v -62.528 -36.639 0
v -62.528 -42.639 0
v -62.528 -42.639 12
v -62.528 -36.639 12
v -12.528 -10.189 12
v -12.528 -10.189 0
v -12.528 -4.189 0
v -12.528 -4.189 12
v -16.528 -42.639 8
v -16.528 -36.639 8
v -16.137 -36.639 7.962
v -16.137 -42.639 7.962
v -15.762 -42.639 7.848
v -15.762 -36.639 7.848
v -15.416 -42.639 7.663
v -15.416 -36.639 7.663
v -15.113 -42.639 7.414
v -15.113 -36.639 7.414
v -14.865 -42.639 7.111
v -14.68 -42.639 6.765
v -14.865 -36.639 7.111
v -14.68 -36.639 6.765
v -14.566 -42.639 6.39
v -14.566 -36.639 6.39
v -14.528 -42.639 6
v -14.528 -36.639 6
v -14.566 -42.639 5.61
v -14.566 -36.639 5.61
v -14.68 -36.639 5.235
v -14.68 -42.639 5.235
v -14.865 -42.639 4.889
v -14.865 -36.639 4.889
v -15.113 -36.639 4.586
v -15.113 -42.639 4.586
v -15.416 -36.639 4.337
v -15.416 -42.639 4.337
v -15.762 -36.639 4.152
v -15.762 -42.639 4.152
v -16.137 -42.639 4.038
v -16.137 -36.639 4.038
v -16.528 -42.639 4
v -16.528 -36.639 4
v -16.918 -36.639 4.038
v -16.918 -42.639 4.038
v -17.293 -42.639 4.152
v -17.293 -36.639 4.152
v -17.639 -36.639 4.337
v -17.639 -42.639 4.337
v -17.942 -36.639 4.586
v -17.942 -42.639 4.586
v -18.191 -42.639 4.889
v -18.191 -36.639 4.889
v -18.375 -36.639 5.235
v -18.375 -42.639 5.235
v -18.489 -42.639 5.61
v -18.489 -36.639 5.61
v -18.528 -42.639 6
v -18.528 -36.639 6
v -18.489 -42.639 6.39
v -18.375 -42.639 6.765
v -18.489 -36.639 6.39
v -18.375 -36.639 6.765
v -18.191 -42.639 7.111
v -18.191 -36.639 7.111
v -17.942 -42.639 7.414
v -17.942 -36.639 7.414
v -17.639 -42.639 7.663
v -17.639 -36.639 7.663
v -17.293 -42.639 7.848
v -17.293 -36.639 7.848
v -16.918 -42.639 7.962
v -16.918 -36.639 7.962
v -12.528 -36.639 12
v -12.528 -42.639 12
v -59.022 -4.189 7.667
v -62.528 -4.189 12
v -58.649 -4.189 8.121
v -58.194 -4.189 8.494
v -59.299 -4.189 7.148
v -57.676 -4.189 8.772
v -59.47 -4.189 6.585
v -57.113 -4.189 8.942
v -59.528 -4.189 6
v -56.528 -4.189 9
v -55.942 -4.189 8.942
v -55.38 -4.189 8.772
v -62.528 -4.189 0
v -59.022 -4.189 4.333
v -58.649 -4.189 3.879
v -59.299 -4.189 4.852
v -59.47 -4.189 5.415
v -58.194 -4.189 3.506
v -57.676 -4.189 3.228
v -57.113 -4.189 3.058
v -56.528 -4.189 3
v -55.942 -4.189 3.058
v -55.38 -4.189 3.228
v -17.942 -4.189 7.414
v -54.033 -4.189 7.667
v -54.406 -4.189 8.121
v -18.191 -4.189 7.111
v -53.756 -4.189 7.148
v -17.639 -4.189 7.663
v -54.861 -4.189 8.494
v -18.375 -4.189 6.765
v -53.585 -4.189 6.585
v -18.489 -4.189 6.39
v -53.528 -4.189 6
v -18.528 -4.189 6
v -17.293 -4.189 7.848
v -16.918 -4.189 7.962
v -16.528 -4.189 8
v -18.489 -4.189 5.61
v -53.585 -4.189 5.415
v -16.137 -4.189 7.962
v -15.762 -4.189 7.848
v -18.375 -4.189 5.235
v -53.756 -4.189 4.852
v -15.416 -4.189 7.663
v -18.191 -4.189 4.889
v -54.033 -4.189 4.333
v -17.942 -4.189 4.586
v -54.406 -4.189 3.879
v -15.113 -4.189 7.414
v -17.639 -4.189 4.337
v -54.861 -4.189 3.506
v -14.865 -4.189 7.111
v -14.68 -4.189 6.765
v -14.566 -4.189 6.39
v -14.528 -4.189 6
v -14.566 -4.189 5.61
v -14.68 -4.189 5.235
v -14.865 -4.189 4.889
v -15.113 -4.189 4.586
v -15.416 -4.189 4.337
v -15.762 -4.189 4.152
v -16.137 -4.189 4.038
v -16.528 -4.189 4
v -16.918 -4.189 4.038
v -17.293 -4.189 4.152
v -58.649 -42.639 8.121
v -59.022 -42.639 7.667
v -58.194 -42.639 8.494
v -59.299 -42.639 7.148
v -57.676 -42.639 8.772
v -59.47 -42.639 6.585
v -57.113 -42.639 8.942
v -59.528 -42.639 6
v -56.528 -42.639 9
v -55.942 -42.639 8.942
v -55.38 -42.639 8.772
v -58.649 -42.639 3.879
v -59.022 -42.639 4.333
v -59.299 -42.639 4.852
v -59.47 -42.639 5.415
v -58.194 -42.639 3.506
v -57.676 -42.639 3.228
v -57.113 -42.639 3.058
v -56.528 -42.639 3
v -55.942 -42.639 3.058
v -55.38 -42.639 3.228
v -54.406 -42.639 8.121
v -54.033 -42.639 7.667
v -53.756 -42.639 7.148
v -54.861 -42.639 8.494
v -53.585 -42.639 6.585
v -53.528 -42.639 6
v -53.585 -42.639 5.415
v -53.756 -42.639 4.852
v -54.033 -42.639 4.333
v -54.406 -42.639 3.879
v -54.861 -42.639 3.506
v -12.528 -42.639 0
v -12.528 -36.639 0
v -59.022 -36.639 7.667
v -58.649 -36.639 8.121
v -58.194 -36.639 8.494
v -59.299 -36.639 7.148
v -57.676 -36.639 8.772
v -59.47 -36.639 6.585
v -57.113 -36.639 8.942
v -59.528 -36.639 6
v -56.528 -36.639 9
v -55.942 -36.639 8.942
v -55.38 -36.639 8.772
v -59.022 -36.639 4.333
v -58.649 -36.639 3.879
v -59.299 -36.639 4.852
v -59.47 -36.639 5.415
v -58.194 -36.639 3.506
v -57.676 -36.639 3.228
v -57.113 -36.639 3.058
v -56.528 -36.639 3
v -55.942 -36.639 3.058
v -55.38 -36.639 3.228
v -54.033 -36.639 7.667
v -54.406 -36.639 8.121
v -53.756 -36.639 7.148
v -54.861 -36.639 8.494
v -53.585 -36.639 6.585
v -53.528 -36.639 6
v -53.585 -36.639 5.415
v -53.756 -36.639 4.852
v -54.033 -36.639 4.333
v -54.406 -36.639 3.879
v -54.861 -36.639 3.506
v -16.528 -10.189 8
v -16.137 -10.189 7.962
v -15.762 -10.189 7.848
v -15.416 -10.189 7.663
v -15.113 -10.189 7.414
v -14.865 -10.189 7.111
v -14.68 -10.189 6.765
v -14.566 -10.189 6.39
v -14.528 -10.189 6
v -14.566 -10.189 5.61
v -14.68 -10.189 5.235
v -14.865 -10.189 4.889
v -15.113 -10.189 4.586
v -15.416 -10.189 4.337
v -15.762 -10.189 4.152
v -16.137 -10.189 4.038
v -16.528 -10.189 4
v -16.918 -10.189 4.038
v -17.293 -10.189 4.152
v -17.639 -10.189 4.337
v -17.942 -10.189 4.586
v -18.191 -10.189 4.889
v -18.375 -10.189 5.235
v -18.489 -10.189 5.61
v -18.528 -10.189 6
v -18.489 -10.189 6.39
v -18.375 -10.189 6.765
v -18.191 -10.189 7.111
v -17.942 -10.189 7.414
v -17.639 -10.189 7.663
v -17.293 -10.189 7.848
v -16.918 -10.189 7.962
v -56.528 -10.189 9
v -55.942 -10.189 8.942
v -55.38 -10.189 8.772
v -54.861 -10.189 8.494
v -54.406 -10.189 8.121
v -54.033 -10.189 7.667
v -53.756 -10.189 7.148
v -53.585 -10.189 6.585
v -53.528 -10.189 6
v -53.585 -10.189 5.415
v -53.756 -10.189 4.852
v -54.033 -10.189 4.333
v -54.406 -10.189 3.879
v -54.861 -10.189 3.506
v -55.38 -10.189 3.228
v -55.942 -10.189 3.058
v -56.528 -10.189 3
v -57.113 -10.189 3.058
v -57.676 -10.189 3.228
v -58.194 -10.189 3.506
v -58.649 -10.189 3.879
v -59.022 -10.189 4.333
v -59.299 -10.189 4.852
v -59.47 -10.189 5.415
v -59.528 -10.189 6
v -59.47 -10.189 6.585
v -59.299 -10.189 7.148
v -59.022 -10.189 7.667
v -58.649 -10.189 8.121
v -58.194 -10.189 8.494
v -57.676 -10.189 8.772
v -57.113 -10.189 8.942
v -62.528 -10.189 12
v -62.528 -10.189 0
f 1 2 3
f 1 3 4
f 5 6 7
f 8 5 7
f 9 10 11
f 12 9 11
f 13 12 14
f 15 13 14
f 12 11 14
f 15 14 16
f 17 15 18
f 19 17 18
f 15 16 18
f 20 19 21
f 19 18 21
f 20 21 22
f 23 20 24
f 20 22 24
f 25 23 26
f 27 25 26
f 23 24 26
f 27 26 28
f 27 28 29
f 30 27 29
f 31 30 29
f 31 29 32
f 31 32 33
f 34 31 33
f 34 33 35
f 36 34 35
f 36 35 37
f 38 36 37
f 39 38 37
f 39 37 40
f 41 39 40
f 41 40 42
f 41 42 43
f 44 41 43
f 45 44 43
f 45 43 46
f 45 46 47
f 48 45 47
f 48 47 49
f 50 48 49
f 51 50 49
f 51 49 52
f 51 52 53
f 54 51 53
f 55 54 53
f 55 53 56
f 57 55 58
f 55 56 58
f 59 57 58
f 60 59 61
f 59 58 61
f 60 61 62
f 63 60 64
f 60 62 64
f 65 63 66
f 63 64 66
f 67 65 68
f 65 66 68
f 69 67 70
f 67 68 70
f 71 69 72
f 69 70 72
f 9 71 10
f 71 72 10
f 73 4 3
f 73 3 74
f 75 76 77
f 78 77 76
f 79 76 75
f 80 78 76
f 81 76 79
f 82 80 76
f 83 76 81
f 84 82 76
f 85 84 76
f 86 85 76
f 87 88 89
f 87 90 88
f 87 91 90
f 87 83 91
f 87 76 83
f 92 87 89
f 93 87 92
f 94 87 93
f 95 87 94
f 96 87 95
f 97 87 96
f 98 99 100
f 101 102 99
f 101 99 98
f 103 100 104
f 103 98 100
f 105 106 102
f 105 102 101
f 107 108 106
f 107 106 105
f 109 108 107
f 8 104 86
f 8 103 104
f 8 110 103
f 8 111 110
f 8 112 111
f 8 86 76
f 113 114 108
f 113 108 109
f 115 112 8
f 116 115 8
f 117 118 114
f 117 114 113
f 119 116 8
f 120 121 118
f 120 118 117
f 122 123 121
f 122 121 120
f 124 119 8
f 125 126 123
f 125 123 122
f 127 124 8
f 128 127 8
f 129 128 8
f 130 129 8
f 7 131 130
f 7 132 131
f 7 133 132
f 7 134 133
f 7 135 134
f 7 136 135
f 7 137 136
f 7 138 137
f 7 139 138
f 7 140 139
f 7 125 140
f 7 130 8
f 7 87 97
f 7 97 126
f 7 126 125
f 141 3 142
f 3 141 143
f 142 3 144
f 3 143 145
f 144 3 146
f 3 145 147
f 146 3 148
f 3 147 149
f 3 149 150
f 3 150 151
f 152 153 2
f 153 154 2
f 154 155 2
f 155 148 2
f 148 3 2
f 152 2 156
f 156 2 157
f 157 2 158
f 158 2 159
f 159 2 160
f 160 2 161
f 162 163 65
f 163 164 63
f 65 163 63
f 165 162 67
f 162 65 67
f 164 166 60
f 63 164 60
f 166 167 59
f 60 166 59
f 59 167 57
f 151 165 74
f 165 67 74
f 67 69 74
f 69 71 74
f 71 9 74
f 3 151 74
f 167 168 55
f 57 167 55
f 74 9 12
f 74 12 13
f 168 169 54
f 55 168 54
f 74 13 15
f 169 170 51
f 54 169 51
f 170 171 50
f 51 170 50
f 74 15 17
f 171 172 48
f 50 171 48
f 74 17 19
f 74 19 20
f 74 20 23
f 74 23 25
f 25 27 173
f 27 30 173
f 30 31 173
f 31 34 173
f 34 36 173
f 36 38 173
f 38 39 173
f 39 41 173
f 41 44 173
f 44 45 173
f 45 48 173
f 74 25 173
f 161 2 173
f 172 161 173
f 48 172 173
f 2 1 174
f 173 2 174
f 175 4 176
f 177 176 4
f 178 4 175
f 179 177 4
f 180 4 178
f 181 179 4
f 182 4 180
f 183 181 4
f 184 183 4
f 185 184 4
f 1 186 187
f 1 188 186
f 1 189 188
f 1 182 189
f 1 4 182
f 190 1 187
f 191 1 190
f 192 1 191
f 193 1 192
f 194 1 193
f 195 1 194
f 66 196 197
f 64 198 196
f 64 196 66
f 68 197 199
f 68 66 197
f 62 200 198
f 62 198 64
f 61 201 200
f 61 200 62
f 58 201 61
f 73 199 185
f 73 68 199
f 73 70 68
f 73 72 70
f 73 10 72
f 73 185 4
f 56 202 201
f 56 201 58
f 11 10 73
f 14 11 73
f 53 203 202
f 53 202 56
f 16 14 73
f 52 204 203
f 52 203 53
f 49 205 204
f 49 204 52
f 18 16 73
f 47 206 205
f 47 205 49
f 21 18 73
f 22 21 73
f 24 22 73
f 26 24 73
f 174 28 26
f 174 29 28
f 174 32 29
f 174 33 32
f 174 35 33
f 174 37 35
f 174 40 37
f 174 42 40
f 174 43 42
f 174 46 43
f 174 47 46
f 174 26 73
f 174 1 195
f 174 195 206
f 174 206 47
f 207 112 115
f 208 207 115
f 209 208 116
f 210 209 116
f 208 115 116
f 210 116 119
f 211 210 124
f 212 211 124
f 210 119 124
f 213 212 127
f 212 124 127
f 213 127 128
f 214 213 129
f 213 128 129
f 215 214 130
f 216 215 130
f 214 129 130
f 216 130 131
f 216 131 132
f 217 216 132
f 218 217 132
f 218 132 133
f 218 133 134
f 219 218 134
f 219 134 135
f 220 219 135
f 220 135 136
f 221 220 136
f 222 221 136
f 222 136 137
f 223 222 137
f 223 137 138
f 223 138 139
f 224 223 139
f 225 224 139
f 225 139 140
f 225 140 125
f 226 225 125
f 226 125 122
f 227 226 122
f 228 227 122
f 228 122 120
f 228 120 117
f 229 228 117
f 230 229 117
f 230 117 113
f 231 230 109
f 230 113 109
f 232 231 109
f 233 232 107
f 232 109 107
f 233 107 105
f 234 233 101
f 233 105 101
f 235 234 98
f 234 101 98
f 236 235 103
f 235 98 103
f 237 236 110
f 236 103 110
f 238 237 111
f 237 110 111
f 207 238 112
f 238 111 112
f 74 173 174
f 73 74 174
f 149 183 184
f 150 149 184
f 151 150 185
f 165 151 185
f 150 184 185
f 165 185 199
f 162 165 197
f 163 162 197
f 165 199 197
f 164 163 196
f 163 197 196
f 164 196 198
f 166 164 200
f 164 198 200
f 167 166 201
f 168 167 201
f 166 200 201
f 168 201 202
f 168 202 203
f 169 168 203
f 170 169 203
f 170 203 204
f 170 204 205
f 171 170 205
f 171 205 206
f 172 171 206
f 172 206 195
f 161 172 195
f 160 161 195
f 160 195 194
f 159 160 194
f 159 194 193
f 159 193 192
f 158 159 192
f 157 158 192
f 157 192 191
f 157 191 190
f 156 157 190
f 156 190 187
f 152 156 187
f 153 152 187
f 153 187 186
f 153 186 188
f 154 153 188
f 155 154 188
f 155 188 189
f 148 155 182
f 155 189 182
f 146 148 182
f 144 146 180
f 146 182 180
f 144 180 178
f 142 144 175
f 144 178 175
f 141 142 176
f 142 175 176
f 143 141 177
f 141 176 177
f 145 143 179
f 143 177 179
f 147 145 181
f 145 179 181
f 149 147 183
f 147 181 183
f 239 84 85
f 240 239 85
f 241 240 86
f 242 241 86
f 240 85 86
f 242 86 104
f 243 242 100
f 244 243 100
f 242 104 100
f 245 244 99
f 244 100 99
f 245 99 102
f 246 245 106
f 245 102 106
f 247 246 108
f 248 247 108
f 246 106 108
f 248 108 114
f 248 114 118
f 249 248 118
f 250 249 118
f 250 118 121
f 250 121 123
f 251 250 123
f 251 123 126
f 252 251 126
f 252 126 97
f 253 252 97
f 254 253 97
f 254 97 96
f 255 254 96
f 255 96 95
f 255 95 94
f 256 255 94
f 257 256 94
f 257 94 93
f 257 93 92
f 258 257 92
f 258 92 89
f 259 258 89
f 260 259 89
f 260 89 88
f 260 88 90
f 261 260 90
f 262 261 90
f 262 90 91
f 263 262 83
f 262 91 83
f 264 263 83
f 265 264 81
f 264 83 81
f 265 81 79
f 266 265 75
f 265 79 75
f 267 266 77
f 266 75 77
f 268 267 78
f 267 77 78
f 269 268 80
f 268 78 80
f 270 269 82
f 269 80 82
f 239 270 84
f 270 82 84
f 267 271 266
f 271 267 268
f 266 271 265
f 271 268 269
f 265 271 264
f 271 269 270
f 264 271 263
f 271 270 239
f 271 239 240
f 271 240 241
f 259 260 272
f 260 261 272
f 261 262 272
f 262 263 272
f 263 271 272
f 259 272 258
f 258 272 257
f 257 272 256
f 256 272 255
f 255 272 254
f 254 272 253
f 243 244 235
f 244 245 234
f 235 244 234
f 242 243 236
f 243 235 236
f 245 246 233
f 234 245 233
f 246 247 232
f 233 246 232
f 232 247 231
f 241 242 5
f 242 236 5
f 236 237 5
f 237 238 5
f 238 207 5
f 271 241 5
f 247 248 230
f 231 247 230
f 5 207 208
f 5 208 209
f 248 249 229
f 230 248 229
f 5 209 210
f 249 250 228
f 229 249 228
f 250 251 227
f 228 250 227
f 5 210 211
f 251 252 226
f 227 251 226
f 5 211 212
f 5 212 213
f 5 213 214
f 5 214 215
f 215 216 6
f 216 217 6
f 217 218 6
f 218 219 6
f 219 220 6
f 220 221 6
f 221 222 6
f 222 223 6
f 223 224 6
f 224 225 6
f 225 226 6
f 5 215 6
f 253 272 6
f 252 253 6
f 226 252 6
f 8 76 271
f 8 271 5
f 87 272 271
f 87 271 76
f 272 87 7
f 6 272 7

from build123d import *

# Parameters (mm, degrees)
IZIM1_W                       = 50
IZIM1_H                       = 6
Y_KSEKLIK_EKSTR_ZYON1_DEPTH   = 12
Y_KSEKLIK_EKSTR_ZYON1_2_DEPTH = 12
IZIM2_R                       = 3
IZIM2_R_2                     = 2
KES_EKSTR_ZYON1_DEPTH         = 40


with BuildPart() as part:
    # Çizim1 → Yükseklik-Ekstrüzyon1 (new body)
    with BuildSketch(Plane.XY):
        with Locations((-37.52756582, -7.189224138)):
            Rectangle(IZIM1_W, IZIM1_H)
    extrude(amount=Y_KSEKLIK_EKSTR_ZYON1_DEPTH)


with BuildPart() as body_2:
    # Çizim1 → Y_kseklik-Ekstr_zyon1 2 (new body)
    with BuildSketch(Plane.XY):
        with Locations((-37.52756582, -39.639224138)):
            Rectangle(IZIM1_W, IZIM1_H)
    extrude(amount=Y_KSEKLIK_EKSTR_ZYON1_2_DEPTH)


with BuildPart() as kes_ekstr_zyon1_tool:
    # Çizim2 → Kes-Ekstrüzyon1 (new body)
    with BuildSketch(Plane(origin=(0, -4.189224138, 0), x_dir=(1, 0, 0), z_dir=(0, 1, 0))):
        with Locations(Location((-56.52756582, -6, 0), (0, 0, 270))):
            Circle(IZIM2_R)
        with Locations(Location((-16.52756582, -6, 0), (0, 0, 270))):
            Circle(IZIM2_R_2)
    extrude(amount=-KES_EKSTR_ZYON1_DEPTH)


with BuildPart() as part_1:
    add(part.part)

    # Kes-Ekstrüzyon1: cut by kes_ekstr_zyon1_tool
    add(kes_ekstr_zyon1_tool.part, mode=Mode.SUBTRACT)


with BuildPart() as body_2_1:
    add(body_2.part)

    # Kes-Ekstrüzyon1: cut by kes_ekstr_zyon1_tool
    add(kes_ekstr_zyon1_tool.part, mode=Mode.SUBTRACT)


solid = Compound([part_1.part, body_2_1.part])
